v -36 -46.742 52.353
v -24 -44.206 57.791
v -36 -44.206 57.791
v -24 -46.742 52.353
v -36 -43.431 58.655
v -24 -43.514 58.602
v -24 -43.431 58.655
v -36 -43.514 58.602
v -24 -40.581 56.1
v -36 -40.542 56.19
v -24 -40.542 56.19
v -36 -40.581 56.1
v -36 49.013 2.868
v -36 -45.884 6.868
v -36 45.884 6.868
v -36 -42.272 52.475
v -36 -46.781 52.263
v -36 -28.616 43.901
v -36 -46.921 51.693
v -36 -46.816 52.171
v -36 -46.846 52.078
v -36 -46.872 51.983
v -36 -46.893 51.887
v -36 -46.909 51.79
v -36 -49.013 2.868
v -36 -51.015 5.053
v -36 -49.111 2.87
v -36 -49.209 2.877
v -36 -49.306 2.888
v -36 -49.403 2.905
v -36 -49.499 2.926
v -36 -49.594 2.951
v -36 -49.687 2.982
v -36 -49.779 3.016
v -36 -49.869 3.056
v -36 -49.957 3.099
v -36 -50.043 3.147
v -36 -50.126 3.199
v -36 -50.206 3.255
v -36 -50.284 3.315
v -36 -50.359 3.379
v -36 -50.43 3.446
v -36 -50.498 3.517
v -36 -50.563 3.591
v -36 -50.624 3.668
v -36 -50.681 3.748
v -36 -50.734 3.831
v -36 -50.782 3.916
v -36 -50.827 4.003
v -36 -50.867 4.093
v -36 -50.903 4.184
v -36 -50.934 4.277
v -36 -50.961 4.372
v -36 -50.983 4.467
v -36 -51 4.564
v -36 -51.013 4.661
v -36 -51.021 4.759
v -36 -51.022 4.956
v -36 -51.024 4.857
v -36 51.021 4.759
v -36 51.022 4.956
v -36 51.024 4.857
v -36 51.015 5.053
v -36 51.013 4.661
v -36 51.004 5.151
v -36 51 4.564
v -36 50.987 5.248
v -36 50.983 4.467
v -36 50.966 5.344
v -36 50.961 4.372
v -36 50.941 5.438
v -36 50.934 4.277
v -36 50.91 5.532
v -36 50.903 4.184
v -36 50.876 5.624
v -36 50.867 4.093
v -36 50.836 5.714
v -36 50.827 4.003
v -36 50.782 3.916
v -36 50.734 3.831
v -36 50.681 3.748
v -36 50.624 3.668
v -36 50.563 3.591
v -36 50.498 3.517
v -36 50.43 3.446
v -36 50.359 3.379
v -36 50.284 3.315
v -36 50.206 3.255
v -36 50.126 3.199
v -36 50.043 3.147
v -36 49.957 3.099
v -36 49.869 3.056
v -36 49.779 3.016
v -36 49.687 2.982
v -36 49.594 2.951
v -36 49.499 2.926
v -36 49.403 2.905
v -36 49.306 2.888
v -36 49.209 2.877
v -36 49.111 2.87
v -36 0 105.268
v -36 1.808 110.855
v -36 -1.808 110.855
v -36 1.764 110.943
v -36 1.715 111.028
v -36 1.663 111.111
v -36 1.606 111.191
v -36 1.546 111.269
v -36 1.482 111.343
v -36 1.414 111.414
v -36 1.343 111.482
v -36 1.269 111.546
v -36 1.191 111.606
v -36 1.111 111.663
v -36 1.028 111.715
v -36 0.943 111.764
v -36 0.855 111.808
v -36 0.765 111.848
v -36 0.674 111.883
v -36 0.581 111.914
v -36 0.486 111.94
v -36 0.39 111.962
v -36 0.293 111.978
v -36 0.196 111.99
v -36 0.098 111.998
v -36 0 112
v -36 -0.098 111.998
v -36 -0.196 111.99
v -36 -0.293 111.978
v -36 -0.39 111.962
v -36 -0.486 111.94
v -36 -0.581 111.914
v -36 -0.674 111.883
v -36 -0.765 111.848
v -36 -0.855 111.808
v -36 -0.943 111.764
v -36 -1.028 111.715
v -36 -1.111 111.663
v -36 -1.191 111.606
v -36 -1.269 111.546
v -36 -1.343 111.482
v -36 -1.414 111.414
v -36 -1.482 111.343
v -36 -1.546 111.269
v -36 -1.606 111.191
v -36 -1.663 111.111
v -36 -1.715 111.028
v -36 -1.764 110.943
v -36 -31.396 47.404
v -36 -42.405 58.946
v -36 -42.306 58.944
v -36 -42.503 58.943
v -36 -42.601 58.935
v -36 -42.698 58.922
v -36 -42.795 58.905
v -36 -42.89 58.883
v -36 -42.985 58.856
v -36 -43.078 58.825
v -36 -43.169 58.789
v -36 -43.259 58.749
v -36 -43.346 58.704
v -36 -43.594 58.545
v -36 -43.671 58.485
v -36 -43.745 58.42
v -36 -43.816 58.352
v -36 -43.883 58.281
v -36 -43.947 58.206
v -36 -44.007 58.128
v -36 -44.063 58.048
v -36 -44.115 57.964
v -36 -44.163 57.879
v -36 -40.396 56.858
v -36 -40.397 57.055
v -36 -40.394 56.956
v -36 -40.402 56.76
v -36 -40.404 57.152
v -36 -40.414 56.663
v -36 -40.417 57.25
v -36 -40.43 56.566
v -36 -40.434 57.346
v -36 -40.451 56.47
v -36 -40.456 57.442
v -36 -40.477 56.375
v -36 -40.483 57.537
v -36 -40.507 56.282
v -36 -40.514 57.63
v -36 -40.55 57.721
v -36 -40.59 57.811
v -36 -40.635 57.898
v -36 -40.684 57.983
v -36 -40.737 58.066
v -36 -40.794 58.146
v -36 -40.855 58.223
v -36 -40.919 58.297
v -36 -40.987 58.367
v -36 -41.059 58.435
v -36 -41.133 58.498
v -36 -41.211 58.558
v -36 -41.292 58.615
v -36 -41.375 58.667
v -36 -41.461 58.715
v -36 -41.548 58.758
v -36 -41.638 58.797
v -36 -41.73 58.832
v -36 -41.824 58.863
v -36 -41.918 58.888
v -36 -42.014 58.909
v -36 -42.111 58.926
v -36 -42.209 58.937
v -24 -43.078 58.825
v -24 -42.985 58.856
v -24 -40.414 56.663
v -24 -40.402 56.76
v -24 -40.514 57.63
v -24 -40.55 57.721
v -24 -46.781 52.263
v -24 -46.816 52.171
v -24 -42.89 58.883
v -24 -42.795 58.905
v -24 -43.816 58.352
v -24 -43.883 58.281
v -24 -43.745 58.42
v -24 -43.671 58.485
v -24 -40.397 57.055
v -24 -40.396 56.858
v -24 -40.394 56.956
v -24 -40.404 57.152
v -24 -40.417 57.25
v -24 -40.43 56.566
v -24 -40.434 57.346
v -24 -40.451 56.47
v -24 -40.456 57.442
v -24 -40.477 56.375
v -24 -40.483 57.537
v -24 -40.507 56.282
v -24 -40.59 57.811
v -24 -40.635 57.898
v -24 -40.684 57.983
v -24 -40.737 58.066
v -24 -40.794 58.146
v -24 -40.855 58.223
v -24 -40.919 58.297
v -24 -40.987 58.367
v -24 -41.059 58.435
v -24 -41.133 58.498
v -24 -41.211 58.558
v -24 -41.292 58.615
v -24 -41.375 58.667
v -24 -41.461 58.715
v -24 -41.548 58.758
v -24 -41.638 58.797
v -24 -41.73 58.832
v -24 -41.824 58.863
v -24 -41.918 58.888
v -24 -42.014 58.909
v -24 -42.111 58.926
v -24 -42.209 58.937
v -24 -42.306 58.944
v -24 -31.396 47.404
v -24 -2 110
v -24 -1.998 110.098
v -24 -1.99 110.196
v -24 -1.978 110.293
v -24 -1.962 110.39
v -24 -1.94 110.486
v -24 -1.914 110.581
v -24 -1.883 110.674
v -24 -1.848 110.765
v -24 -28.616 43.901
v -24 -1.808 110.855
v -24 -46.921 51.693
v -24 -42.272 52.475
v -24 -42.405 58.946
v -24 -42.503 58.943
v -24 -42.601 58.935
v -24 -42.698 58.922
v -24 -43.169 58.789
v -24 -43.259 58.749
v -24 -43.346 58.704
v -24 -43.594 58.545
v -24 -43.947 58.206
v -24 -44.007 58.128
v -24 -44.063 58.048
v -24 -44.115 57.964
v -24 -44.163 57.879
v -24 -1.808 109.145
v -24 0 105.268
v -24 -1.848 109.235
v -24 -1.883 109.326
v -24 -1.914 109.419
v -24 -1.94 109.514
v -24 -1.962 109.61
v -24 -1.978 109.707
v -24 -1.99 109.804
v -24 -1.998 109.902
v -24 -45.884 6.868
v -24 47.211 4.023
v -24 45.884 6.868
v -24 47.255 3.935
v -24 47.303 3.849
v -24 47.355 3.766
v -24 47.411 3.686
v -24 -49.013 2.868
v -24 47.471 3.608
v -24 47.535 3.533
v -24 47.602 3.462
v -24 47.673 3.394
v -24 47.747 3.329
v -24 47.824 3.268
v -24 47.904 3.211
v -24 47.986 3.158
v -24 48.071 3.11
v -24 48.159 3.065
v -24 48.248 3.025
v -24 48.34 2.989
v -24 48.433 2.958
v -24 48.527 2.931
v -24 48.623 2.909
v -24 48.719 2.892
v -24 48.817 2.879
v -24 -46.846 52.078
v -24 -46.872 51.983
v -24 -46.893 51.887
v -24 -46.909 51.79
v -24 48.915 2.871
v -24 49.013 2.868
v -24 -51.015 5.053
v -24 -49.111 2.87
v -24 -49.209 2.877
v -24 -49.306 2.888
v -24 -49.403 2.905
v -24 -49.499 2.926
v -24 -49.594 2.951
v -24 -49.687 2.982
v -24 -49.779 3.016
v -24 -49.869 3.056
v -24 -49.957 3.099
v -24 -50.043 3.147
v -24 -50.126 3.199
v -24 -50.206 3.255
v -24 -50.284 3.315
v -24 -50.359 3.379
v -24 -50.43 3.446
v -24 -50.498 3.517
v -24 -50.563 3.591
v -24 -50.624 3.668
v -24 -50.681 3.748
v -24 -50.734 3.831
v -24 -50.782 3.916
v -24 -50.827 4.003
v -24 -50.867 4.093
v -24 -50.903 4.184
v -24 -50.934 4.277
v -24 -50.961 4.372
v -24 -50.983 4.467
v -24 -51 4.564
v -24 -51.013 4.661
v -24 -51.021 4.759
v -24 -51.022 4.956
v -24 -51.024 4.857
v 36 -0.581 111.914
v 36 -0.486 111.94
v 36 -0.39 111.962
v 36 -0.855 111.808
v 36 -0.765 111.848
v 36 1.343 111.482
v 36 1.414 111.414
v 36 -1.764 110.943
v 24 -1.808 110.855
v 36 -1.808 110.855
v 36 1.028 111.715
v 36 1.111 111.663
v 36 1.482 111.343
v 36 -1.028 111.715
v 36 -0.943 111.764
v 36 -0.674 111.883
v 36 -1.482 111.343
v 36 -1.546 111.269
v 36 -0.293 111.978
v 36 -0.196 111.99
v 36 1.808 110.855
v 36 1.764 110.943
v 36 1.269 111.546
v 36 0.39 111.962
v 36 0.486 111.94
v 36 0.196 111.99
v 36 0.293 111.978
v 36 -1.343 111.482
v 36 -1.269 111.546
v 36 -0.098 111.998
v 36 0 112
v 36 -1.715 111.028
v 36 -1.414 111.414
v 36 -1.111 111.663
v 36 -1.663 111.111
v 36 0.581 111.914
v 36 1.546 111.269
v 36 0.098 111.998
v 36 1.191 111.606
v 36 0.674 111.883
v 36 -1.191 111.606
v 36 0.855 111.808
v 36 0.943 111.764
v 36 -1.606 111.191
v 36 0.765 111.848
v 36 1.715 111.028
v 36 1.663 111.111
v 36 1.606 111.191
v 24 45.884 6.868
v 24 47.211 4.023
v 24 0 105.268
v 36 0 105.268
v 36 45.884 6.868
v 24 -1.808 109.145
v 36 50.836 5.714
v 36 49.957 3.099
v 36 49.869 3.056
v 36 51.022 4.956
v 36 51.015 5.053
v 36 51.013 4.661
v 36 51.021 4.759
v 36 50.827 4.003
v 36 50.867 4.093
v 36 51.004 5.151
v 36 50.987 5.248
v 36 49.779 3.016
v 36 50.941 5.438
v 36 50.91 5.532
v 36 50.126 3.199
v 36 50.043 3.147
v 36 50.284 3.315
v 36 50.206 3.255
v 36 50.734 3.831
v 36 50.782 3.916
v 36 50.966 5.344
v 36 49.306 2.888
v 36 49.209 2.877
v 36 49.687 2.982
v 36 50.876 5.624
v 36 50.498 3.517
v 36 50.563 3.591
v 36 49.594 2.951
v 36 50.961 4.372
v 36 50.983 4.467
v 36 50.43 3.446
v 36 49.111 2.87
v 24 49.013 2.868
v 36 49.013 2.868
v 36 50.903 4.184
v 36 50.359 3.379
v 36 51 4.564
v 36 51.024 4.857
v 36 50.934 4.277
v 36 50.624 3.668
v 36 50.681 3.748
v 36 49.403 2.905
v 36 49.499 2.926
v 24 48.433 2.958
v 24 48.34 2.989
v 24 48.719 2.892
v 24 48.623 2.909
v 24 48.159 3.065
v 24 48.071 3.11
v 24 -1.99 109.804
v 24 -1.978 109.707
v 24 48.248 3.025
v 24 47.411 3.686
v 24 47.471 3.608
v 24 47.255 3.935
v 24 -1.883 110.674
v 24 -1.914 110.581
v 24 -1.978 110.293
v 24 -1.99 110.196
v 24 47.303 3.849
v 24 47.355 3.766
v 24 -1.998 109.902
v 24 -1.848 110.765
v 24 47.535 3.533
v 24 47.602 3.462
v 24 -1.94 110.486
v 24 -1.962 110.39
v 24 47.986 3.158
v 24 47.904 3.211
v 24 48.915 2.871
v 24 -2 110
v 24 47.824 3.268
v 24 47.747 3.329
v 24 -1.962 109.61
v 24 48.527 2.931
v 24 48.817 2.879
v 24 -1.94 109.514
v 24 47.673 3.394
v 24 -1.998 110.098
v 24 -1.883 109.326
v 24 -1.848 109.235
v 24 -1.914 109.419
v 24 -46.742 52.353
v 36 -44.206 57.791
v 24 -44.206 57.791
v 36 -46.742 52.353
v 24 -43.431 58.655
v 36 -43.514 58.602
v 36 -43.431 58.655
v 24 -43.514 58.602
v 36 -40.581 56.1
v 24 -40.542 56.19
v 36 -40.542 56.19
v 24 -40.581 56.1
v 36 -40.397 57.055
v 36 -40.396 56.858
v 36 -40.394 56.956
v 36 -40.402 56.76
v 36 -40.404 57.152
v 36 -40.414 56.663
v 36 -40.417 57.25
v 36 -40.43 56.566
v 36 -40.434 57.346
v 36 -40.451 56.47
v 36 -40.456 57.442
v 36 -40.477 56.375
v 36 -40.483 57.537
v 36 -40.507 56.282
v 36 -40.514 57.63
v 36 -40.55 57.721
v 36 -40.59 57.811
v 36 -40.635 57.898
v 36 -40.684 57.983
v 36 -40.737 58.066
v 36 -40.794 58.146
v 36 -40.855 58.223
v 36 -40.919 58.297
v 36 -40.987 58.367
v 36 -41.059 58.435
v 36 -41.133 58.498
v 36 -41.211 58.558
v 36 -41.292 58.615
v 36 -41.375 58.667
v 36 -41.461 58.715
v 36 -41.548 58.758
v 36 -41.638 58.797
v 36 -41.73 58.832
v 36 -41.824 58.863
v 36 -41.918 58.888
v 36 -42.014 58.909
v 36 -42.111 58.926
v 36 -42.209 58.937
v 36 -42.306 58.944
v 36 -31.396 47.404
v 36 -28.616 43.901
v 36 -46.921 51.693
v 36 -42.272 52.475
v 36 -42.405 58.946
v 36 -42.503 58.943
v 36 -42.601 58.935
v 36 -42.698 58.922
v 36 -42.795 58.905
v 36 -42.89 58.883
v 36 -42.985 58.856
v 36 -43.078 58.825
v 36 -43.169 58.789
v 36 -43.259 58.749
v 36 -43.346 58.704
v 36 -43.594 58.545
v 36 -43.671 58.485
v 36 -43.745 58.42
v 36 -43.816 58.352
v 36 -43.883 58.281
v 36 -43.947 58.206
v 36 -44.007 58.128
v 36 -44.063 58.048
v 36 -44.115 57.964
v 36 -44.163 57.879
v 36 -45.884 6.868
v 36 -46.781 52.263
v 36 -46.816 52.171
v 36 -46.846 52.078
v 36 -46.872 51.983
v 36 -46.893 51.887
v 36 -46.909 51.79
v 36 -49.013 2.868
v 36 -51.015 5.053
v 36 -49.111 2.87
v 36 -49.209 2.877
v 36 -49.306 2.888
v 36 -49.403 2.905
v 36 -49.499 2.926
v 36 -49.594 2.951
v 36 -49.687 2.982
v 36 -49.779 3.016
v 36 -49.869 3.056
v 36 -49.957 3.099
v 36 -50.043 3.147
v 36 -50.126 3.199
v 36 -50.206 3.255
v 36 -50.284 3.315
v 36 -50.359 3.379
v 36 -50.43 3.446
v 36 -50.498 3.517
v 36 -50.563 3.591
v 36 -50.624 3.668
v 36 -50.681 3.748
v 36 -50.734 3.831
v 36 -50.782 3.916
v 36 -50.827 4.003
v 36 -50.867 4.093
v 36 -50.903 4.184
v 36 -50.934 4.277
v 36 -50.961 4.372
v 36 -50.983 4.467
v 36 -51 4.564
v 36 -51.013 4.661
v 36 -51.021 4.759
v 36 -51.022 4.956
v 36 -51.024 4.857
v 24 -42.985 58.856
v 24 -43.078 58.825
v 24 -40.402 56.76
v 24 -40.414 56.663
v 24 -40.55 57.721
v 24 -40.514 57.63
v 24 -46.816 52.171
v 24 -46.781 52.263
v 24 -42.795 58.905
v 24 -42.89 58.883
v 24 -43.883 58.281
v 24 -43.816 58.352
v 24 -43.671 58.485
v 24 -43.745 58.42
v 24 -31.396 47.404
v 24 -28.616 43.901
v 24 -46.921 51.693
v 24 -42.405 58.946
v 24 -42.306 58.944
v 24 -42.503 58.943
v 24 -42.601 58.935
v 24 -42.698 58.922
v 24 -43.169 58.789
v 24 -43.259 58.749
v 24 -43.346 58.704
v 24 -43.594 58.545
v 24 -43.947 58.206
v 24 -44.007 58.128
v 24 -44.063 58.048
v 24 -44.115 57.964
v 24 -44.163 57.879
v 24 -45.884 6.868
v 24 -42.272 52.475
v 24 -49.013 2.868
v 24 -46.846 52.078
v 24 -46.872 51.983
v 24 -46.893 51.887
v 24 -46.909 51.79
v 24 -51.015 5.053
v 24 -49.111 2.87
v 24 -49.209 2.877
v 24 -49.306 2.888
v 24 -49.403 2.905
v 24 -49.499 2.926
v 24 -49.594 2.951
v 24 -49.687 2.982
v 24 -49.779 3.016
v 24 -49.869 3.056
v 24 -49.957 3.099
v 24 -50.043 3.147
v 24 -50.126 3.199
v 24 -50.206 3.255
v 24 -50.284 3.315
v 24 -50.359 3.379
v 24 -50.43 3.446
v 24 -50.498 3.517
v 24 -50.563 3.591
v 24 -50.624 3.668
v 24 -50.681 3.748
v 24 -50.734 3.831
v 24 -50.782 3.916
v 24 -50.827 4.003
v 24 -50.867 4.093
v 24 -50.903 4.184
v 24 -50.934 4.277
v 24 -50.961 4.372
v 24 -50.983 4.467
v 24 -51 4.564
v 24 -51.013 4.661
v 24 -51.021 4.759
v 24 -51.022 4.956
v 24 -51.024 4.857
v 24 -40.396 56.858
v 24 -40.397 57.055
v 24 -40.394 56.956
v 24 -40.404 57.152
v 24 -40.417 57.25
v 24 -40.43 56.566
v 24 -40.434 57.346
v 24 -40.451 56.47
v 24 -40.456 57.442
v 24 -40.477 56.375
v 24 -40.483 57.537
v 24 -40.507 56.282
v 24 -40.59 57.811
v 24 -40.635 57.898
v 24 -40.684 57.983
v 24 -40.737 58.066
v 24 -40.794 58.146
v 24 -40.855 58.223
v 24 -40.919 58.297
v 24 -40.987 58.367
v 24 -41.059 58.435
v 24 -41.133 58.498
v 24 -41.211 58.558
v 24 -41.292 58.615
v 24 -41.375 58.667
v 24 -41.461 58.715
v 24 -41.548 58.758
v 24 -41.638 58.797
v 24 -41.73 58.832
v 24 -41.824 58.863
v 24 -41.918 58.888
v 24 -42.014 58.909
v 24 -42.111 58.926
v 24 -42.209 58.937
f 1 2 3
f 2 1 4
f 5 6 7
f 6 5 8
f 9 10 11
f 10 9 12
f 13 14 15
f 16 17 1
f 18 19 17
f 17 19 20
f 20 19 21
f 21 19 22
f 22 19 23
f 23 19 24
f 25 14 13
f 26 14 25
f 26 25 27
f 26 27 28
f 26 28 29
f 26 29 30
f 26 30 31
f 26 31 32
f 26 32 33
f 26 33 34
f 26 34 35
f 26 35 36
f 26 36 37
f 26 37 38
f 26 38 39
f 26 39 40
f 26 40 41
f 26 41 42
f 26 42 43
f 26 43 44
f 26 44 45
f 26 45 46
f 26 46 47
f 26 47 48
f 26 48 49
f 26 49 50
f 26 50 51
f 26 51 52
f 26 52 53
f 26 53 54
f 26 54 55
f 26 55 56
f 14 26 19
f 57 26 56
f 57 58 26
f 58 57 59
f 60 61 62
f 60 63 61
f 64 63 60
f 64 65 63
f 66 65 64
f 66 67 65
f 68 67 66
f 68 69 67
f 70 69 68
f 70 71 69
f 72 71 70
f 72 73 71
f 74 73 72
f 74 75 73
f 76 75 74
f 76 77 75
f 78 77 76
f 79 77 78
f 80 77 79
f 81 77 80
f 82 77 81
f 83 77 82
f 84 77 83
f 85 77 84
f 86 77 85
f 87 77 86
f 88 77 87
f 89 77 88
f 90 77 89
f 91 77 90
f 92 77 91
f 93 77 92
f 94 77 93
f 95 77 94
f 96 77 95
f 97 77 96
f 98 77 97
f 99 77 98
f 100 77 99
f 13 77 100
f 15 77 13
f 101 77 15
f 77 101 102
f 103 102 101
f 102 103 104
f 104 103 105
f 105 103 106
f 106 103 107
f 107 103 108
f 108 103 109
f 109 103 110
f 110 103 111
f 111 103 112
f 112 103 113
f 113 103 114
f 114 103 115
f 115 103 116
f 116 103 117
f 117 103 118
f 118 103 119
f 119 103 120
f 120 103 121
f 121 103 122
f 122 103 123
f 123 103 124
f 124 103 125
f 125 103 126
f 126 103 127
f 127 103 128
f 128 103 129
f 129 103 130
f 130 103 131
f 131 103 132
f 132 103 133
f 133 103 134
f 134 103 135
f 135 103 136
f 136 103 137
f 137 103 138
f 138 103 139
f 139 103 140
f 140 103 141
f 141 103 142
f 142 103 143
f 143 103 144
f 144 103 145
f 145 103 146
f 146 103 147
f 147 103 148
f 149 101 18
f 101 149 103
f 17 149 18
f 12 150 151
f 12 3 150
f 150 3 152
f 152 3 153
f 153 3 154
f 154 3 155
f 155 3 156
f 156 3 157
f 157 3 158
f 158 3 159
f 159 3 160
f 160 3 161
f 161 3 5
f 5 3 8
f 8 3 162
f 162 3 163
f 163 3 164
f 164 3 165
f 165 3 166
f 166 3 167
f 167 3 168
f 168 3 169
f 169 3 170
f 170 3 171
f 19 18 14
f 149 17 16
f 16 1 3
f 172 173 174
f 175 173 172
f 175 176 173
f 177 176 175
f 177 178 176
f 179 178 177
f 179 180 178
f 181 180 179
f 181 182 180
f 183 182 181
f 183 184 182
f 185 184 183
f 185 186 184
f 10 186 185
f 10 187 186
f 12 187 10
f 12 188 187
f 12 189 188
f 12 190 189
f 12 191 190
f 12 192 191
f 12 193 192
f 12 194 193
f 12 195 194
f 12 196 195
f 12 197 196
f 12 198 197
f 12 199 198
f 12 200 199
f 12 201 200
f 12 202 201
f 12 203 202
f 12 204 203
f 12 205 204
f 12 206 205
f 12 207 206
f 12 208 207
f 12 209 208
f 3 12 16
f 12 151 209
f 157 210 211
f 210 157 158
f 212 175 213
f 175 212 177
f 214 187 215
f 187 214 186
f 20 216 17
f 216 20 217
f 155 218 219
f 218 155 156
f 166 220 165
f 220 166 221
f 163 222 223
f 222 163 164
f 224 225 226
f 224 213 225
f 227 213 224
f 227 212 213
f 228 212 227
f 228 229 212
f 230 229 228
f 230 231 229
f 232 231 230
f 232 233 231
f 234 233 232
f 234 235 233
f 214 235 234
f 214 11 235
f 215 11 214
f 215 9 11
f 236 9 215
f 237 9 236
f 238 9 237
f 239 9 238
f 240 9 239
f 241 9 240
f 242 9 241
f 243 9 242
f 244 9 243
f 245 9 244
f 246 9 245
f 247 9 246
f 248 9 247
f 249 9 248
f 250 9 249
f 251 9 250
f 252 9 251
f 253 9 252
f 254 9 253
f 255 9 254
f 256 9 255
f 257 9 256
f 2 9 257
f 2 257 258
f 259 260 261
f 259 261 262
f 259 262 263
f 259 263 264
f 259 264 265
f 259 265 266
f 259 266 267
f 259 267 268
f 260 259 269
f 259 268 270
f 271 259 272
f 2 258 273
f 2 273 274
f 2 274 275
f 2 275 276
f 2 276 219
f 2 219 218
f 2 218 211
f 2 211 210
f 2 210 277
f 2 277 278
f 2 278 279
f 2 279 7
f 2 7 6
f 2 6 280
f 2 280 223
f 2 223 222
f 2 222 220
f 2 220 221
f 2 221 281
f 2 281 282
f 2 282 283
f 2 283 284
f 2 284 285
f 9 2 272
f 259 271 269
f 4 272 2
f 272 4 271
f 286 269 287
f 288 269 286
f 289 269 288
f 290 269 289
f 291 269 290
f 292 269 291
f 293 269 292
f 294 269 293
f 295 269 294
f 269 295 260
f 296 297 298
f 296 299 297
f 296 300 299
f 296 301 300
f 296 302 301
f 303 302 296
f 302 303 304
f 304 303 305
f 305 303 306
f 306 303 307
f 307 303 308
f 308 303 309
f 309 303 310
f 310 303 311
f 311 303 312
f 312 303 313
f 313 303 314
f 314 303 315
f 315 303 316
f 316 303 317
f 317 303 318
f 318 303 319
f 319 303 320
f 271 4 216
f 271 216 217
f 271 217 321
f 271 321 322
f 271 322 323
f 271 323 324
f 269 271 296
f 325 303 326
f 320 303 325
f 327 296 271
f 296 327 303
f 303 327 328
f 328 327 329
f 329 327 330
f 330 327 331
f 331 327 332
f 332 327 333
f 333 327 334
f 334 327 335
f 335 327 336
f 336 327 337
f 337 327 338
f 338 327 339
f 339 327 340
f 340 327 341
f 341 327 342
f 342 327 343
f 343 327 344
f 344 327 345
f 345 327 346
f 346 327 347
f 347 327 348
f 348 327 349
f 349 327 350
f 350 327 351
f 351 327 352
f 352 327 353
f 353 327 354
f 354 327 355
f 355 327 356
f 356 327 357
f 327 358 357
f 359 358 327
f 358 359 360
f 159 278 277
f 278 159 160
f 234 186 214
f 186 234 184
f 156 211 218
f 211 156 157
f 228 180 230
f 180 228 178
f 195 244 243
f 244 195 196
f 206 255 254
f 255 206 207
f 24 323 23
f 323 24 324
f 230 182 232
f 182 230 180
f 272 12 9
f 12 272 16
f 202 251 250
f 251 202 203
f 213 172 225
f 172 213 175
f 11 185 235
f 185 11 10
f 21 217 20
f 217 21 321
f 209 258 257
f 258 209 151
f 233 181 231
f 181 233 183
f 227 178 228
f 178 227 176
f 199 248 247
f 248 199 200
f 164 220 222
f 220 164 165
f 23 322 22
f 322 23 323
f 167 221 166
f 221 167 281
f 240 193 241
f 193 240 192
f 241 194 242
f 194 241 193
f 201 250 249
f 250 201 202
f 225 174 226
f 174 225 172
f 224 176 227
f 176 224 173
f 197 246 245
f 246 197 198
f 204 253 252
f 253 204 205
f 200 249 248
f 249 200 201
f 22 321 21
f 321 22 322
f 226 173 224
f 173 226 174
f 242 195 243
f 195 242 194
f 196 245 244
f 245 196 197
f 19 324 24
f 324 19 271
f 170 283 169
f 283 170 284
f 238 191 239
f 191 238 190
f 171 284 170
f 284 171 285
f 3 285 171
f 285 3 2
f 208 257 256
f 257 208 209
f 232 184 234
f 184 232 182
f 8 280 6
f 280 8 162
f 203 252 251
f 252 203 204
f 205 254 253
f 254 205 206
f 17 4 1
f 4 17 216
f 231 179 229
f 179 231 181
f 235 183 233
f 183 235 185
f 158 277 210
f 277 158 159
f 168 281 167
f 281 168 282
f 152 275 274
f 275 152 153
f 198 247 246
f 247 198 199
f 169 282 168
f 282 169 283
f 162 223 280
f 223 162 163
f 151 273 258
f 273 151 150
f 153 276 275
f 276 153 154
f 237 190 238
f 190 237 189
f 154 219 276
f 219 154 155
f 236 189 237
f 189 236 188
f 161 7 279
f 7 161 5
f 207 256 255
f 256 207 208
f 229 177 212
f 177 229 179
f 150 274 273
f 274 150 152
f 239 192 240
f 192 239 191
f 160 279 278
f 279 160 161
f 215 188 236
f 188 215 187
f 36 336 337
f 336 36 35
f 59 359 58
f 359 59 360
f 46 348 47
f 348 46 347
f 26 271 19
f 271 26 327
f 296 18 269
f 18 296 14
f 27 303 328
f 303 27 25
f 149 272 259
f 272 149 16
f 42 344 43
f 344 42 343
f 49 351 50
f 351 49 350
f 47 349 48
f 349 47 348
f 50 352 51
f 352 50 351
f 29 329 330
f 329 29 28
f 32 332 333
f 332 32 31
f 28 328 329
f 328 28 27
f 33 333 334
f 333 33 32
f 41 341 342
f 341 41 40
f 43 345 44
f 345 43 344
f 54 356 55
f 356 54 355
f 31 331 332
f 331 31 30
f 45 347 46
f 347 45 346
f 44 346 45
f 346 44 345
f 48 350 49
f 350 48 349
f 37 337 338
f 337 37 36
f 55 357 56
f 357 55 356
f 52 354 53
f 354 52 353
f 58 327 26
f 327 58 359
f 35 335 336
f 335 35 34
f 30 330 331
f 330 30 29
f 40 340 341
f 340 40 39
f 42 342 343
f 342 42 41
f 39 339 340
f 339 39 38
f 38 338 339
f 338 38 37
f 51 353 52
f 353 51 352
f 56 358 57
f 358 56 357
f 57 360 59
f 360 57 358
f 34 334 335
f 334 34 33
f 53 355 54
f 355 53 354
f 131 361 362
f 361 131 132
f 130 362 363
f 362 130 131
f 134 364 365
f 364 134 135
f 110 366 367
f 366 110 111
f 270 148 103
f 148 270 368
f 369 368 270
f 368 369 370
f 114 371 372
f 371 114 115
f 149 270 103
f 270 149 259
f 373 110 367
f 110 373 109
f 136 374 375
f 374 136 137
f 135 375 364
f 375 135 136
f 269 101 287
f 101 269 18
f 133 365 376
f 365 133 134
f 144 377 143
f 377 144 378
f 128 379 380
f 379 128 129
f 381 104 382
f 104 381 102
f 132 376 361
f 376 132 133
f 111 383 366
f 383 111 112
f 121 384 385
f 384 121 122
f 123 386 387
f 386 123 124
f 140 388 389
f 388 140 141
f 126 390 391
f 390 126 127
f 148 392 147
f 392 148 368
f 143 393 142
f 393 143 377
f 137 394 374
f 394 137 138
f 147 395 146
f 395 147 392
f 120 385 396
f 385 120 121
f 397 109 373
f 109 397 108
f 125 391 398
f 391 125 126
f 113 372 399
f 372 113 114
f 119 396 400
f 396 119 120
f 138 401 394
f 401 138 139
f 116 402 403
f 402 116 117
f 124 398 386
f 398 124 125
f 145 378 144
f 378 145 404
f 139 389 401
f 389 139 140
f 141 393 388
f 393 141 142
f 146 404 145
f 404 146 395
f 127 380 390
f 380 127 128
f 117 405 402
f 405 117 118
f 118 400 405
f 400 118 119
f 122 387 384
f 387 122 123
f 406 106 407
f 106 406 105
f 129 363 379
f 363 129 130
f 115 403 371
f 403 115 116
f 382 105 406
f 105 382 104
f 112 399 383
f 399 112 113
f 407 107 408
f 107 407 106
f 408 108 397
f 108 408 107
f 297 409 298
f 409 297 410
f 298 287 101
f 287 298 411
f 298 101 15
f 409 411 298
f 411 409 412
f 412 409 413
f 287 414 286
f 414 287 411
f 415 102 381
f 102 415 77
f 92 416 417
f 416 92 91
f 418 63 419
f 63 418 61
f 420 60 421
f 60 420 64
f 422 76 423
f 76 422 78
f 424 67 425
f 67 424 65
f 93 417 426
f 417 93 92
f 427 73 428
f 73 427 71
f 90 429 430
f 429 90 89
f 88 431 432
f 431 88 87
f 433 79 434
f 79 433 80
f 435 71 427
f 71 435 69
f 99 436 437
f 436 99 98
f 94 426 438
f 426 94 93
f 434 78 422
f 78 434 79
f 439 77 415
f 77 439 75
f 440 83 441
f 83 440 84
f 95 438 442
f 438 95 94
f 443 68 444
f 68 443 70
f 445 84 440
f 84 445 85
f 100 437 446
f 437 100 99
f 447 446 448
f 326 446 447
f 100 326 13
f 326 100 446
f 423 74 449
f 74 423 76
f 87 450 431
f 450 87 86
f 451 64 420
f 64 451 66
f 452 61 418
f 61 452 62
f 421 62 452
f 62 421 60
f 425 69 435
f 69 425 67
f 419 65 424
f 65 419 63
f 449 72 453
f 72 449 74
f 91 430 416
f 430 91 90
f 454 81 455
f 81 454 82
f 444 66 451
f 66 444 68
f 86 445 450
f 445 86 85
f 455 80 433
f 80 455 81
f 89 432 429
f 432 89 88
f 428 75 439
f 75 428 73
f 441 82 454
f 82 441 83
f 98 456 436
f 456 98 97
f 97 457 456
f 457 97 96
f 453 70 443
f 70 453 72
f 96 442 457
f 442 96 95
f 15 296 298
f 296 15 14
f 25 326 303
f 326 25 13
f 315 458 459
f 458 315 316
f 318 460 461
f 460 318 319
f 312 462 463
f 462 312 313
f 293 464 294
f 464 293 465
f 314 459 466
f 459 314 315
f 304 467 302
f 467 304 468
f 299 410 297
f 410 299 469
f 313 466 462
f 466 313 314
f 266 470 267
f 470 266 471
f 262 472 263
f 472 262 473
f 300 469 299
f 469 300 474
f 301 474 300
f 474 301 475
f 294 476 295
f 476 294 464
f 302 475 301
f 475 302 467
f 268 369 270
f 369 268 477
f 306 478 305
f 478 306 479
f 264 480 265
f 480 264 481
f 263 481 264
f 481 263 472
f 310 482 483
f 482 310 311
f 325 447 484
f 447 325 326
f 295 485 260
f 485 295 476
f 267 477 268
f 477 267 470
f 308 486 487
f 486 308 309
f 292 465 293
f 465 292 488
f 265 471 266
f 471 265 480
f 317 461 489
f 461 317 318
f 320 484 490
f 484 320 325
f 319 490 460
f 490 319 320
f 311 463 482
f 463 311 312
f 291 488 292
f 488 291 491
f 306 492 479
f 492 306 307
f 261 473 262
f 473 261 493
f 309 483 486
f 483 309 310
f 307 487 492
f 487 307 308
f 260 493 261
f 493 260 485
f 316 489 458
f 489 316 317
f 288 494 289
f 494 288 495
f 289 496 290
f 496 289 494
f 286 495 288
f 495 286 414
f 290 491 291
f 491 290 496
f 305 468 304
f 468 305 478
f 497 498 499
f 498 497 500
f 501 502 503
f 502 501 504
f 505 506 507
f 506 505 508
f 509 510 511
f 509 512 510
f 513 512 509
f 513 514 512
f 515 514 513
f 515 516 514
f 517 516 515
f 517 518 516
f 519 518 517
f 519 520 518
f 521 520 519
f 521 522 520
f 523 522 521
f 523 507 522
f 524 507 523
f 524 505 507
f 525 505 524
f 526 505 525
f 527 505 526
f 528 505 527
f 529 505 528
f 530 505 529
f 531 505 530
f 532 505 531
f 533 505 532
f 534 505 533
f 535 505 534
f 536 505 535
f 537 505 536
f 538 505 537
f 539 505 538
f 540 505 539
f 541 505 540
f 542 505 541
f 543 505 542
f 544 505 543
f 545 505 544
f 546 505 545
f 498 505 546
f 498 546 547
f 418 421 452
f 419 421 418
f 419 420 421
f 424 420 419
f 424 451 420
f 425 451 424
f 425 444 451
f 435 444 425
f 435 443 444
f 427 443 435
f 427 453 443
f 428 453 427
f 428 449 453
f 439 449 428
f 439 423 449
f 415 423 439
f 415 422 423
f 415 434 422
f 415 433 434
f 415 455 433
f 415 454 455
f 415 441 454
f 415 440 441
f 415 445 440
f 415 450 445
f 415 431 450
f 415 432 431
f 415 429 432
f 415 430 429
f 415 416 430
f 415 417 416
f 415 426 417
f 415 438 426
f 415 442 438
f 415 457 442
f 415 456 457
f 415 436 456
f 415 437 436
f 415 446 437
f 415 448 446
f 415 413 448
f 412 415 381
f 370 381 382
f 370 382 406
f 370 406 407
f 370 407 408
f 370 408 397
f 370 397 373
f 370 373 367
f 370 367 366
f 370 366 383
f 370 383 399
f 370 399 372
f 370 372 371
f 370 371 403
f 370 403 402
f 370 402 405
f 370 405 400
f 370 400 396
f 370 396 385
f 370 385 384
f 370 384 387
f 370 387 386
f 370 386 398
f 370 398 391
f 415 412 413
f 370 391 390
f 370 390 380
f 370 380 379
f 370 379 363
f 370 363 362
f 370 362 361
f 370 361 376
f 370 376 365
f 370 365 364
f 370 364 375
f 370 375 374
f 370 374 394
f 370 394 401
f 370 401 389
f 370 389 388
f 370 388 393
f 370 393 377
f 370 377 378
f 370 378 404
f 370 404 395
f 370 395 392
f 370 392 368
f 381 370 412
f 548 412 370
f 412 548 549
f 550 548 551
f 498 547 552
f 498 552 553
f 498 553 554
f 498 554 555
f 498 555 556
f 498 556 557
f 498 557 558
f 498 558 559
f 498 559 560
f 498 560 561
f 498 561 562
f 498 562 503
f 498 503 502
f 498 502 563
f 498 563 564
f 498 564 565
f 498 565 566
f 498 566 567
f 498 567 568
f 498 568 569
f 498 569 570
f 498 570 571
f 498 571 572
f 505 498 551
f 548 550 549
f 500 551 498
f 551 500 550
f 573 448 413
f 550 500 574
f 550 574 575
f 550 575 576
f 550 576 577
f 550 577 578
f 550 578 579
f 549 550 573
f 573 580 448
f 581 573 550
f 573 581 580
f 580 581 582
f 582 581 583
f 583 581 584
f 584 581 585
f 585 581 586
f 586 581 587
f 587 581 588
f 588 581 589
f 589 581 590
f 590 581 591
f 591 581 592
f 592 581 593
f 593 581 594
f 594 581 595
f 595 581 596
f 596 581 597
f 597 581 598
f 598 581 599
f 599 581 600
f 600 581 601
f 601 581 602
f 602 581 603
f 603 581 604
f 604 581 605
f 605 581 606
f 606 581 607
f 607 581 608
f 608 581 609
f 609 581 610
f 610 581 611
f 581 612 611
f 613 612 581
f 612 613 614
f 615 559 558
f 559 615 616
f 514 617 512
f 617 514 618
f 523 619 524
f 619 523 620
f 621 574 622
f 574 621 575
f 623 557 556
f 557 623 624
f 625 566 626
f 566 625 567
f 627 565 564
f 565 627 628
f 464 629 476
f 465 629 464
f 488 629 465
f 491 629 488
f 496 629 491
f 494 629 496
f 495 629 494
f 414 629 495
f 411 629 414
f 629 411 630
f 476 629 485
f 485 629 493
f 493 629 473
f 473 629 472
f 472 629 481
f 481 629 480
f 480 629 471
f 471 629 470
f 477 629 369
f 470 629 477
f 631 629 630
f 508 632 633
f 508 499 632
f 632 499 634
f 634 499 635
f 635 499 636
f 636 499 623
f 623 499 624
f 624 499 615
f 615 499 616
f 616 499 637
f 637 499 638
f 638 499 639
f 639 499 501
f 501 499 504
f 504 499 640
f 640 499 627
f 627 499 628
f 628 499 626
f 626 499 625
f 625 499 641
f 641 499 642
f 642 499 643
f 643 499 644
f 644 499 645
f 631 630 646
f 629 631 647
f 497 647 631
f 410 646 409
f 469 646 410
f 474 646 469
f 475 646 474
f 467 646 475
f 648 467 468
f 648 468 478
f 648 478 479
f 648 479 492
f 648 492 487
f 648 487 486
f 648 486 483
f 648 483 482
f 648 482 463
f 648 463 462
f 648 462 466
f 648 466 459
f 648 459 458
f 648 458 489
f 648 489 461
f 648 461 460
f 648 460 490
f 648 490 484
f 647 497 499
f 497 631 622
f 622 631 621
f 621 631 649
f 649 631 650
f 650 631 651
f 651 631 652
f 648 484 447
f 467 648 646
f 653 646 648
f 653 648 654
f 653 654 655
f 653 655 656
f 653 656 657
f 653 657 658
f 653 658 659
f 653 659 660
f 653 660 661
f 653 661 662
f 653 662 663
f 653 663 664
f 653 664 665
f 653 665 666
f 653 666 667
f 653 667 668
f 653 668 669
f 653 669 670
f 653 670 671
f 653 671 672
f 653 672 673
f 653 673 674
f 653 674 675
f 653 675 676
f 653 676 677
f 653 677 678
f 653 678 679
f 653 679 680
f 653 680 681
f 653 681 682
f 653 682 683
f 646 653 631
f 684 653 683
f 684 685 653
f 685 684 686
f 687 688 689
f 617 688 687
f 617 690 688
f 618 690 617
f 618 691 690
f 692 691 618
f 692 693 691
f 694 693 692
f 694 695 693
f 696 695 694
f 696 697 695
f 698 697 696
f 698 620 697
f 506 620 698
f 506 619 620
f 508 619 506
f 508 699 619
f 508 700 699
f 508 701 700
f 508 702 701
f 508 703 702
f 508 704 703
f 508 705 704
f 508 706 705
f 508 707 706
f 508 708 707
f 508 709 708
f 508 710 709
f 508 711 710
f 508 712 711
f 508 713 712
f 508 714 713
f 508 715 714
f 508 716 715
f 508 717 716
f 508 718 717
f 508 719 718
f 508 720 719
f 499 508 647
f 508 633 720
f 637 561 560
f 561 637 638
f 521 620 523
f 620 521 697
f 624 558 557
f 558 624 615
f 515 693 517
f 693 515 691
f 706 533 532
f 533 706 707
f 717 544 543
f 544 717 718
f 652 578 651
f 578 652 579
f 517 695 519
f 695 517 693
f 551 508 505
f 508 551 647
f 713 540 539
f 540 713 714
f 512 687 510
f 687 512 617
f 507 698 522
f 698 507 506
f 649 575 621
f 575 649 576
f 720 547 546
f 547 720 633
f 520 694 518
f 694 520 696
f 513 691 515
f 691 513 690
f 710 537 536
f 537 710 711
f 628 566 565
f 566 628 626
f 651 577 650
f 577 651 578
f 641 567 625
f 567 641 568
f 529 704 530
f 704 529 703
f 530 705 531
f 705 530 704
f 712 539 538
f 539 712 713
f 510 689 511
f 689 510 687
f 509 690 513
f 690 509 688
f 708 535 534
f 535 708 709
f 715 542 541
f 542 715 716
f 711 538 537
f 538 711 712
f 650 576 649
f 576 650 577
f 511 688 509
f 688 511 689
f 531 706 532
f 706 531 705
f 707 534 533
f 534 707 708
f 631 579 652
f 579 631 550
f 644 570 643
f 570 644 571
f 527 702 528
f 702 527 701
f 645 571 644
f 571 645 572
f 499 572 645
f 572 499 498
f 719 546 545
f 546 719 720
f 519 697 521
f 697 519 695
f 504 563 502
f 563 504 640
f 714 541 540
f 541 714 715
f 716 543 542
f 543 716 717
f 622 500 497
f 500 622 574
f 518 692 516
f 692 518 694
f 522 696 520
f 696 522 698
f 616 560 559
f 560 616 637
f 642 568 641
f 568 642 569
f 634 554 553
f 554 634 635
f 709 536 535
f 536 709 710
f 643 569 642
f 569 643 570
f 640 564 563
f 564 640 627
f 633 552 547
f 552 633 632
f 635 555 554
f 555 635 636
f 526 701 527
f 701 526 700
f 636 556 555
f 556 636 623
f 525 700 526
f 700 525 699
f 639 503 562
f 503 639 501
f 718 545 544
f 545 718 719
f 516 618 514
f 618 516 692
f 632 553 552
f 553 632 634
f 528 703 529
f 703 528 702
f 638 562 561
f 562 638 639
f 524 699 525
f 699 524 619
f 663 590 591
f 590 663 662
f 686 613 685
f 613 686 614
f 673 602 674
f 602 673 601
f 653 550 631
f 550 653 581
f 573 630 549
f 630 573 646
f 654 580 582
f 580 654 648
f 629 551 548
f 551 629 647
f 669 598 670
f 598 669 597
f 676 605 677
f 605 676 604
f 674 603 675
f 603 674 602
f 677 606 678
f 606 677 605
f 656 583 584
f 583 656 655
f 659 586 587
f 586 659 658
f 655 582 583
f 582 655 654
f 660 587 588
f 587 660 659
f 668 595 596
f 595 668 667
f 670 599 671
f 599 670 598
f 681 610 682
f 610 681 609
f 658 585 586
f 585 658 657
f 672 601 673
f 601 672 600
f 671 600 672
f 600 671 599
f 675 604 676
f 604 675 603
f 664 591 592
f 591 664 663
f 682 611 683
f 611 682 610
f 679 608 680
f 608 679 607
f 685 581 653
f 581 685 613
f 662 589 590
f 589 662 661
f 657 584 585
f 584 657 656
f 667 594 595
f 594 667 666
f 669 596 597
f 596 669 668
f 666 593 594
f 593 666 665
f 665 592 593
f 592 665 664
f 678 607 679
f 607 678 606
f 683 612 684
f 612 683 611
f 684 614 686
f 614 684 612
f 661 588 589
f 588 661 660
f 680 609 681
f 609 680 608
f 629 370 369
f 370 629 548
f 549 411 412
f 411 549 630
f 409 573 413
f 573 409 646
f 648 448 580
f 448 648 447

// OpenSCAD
fragments= 128;
isPhoneV = false;
isPhoneH = false;
isBar = false;

module c0602() {
    rotate([0, 0, 25])
    translate([-116, 0, 0])
    cylinder(h=12, r=2, center=true, $fn=fragments);
}
module c0603() {
    rotate([0, 0, -25])
    translate([-116, 0, 0])
    cylinder(h=12, r=2, center=true, $fn=fragments);
}


module c01() {
    rotate([0, 0, 25])
    translate([-66, -16, 0])
    cylinder(h=12, r=2, center=true, $fn=fragments);
}
module c02() {
    rotate([0, 0, 25])
    translate([-72, -16, 0])
    cylinder(h=12, r=2, center=true, $fn=fragments);
}
module c03() {
    rotate([0, 0, 25])
    rotate([0, 0, 180])
    translate([72, 0, 0])
    cylinder(h=12, r=2, center=true, $fn=fragments);
}
module c04() {
    rotate([0, 0, 0])
    translate([0, 0, 0])
    cylinder(h=12, r=2, center=true, $fn=fragments);
            
}


module base() {
    union() {
        hull() {
            c01();
            c02();
        }
        hull() {
            c02();
            c03();
            c0602();
        }
            
        
        hull() {
            c04();
            c0602();
        }
        hull() {
            c04();
            c0603();
        }
        hull() {
            c0602();
            c0603();
        }
        
        
    }
    
}

module a() {
    translate([0, 0, 30])
    base();

    hull() {
        translate([0, 0, 30])
        c04();
        c04();
        c0603();
        translate([0, 0, 30])
        c0603();
    }
}

module body() {
    a();
    mirror([0,0,1])
    a();
}

translate([0, 0, 110])
rotate([0, -90, 0])
body();

if (isPhoneV) {
    translate([0, -5, 118])
    rotate([-25, 0, 0])
    cube([72, 10, 148], center=true);
}


if (isPhoneH) {
    translate([0, -21, 83])
    rotate([-25, 0, 0])
    cube([148, 10, 72], center=true);
}

if (isBar) {
    translate([20, 58, 0])
    cube([200, 10, 10], center=true);
    translate([20, -41, 0])
    cube([200, 10, 10], center=true);
}
